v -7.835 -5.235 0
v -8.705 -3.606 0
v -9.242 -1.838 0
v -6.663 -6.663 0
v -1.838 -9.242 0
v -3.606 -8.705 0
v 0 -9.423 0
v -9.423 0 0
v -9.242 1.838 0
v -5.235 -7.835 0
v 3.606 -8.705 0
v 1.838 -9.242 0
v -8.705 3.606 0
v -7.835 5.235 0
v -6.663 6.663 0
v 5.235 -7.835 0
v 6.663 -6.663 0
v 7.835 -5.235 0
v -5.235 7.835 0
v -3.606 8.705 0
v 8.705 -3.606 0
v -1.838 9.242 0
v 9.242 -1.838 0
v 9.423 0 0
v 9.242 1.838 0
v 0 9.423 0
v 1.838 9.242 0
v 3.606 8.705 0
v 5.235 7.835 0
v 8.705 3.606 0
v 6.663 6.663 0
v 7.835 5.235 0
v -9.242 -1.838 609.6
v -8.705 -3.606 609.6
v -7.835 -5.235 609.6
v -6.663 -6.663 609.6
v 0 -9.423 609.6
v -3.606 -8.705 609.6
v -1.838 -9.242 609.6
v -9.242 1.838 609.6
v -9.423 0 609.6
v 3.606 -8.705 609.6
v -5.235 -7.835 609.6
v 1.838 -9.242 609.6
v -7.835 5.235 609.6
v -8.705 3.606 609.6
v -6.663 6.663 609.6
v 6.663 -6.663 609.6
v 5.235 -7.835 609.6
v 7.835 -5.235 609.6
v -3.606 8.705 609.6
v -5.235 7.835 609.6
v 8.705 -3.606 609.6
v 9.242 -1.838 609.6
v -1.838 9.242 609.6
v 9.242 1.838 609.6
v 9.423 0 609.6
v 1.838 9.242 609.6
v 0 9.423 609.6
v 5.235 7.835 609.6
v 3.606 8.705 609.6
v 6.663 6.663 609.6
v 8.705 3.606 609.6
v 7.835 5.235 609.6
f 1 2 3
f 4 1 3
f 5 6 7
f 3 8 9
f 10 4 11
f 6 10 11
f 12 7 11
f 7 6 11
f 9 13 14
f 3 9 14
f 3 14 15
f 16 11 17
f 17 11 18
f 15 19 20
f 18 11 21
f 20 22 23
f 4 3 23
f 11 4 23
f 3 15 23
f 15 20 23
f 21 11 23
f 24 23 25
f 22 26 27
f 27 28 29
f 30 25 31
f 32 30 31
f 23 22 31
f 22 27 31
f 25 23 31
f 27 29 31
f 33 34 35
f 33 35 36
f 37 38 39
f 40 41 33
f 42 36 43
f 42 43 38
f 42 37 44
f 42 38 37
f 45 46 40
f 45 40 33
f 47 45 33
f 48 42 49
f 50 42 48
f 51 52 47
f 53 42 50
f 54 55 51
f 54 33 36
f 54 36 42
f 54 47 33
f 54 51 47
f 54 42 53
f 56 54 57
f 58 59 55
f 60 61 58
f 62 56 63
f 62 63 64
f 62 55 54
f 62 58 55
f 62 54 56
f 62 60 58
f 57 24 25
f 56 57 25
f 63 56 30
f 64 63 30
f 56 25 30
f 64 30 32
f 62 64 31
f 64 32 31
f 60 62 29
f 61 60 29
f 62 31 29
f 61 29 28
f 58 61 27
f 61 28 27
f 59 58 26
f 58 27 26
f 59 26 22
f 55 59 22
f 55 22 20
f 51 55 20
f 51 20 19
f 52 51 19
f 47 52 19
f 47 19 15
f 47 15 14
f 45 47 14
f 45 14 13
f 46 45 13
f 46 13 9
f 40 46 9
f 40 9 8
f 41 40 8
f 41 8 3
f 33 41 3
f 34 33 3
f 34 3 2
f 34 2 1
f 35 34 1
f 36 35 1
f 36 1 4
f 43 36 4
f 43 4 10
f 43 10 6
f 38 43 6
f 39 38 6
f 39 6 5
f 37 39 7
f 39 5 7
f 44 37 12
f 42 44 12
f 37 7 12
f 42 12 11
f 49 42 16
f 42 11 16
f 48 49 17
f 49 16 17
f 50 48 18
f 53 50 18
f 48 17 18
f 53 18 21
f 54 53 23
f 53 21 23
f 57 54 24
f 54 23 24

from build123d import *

# Parameters (mm, degrees)
F0_R     = 9.422662
F1_DEPTH = 254
F2_DEPTH = 609.6
F3_DEPTH = 609.6


with BuildPart() as f1:
    # F0 (on Top) → F1 (new body)
    with BuildSketch(Plane.XY):
        Circle(F0_R)
    extrude(amount=F1_DEPTH)

    # F0 (on Top) → F2 (join)
    with BuildSketch(Plane.XY):
        Circle(F0_R)
    extrude(amount=F2_DEPTH)

    # F0 (on Top) → F3 (join)
    with BuildSketch(Plane.XY):
        Circle(F0_R)
    extrude(amount=F3_DEPTH)


solid = f1.part
